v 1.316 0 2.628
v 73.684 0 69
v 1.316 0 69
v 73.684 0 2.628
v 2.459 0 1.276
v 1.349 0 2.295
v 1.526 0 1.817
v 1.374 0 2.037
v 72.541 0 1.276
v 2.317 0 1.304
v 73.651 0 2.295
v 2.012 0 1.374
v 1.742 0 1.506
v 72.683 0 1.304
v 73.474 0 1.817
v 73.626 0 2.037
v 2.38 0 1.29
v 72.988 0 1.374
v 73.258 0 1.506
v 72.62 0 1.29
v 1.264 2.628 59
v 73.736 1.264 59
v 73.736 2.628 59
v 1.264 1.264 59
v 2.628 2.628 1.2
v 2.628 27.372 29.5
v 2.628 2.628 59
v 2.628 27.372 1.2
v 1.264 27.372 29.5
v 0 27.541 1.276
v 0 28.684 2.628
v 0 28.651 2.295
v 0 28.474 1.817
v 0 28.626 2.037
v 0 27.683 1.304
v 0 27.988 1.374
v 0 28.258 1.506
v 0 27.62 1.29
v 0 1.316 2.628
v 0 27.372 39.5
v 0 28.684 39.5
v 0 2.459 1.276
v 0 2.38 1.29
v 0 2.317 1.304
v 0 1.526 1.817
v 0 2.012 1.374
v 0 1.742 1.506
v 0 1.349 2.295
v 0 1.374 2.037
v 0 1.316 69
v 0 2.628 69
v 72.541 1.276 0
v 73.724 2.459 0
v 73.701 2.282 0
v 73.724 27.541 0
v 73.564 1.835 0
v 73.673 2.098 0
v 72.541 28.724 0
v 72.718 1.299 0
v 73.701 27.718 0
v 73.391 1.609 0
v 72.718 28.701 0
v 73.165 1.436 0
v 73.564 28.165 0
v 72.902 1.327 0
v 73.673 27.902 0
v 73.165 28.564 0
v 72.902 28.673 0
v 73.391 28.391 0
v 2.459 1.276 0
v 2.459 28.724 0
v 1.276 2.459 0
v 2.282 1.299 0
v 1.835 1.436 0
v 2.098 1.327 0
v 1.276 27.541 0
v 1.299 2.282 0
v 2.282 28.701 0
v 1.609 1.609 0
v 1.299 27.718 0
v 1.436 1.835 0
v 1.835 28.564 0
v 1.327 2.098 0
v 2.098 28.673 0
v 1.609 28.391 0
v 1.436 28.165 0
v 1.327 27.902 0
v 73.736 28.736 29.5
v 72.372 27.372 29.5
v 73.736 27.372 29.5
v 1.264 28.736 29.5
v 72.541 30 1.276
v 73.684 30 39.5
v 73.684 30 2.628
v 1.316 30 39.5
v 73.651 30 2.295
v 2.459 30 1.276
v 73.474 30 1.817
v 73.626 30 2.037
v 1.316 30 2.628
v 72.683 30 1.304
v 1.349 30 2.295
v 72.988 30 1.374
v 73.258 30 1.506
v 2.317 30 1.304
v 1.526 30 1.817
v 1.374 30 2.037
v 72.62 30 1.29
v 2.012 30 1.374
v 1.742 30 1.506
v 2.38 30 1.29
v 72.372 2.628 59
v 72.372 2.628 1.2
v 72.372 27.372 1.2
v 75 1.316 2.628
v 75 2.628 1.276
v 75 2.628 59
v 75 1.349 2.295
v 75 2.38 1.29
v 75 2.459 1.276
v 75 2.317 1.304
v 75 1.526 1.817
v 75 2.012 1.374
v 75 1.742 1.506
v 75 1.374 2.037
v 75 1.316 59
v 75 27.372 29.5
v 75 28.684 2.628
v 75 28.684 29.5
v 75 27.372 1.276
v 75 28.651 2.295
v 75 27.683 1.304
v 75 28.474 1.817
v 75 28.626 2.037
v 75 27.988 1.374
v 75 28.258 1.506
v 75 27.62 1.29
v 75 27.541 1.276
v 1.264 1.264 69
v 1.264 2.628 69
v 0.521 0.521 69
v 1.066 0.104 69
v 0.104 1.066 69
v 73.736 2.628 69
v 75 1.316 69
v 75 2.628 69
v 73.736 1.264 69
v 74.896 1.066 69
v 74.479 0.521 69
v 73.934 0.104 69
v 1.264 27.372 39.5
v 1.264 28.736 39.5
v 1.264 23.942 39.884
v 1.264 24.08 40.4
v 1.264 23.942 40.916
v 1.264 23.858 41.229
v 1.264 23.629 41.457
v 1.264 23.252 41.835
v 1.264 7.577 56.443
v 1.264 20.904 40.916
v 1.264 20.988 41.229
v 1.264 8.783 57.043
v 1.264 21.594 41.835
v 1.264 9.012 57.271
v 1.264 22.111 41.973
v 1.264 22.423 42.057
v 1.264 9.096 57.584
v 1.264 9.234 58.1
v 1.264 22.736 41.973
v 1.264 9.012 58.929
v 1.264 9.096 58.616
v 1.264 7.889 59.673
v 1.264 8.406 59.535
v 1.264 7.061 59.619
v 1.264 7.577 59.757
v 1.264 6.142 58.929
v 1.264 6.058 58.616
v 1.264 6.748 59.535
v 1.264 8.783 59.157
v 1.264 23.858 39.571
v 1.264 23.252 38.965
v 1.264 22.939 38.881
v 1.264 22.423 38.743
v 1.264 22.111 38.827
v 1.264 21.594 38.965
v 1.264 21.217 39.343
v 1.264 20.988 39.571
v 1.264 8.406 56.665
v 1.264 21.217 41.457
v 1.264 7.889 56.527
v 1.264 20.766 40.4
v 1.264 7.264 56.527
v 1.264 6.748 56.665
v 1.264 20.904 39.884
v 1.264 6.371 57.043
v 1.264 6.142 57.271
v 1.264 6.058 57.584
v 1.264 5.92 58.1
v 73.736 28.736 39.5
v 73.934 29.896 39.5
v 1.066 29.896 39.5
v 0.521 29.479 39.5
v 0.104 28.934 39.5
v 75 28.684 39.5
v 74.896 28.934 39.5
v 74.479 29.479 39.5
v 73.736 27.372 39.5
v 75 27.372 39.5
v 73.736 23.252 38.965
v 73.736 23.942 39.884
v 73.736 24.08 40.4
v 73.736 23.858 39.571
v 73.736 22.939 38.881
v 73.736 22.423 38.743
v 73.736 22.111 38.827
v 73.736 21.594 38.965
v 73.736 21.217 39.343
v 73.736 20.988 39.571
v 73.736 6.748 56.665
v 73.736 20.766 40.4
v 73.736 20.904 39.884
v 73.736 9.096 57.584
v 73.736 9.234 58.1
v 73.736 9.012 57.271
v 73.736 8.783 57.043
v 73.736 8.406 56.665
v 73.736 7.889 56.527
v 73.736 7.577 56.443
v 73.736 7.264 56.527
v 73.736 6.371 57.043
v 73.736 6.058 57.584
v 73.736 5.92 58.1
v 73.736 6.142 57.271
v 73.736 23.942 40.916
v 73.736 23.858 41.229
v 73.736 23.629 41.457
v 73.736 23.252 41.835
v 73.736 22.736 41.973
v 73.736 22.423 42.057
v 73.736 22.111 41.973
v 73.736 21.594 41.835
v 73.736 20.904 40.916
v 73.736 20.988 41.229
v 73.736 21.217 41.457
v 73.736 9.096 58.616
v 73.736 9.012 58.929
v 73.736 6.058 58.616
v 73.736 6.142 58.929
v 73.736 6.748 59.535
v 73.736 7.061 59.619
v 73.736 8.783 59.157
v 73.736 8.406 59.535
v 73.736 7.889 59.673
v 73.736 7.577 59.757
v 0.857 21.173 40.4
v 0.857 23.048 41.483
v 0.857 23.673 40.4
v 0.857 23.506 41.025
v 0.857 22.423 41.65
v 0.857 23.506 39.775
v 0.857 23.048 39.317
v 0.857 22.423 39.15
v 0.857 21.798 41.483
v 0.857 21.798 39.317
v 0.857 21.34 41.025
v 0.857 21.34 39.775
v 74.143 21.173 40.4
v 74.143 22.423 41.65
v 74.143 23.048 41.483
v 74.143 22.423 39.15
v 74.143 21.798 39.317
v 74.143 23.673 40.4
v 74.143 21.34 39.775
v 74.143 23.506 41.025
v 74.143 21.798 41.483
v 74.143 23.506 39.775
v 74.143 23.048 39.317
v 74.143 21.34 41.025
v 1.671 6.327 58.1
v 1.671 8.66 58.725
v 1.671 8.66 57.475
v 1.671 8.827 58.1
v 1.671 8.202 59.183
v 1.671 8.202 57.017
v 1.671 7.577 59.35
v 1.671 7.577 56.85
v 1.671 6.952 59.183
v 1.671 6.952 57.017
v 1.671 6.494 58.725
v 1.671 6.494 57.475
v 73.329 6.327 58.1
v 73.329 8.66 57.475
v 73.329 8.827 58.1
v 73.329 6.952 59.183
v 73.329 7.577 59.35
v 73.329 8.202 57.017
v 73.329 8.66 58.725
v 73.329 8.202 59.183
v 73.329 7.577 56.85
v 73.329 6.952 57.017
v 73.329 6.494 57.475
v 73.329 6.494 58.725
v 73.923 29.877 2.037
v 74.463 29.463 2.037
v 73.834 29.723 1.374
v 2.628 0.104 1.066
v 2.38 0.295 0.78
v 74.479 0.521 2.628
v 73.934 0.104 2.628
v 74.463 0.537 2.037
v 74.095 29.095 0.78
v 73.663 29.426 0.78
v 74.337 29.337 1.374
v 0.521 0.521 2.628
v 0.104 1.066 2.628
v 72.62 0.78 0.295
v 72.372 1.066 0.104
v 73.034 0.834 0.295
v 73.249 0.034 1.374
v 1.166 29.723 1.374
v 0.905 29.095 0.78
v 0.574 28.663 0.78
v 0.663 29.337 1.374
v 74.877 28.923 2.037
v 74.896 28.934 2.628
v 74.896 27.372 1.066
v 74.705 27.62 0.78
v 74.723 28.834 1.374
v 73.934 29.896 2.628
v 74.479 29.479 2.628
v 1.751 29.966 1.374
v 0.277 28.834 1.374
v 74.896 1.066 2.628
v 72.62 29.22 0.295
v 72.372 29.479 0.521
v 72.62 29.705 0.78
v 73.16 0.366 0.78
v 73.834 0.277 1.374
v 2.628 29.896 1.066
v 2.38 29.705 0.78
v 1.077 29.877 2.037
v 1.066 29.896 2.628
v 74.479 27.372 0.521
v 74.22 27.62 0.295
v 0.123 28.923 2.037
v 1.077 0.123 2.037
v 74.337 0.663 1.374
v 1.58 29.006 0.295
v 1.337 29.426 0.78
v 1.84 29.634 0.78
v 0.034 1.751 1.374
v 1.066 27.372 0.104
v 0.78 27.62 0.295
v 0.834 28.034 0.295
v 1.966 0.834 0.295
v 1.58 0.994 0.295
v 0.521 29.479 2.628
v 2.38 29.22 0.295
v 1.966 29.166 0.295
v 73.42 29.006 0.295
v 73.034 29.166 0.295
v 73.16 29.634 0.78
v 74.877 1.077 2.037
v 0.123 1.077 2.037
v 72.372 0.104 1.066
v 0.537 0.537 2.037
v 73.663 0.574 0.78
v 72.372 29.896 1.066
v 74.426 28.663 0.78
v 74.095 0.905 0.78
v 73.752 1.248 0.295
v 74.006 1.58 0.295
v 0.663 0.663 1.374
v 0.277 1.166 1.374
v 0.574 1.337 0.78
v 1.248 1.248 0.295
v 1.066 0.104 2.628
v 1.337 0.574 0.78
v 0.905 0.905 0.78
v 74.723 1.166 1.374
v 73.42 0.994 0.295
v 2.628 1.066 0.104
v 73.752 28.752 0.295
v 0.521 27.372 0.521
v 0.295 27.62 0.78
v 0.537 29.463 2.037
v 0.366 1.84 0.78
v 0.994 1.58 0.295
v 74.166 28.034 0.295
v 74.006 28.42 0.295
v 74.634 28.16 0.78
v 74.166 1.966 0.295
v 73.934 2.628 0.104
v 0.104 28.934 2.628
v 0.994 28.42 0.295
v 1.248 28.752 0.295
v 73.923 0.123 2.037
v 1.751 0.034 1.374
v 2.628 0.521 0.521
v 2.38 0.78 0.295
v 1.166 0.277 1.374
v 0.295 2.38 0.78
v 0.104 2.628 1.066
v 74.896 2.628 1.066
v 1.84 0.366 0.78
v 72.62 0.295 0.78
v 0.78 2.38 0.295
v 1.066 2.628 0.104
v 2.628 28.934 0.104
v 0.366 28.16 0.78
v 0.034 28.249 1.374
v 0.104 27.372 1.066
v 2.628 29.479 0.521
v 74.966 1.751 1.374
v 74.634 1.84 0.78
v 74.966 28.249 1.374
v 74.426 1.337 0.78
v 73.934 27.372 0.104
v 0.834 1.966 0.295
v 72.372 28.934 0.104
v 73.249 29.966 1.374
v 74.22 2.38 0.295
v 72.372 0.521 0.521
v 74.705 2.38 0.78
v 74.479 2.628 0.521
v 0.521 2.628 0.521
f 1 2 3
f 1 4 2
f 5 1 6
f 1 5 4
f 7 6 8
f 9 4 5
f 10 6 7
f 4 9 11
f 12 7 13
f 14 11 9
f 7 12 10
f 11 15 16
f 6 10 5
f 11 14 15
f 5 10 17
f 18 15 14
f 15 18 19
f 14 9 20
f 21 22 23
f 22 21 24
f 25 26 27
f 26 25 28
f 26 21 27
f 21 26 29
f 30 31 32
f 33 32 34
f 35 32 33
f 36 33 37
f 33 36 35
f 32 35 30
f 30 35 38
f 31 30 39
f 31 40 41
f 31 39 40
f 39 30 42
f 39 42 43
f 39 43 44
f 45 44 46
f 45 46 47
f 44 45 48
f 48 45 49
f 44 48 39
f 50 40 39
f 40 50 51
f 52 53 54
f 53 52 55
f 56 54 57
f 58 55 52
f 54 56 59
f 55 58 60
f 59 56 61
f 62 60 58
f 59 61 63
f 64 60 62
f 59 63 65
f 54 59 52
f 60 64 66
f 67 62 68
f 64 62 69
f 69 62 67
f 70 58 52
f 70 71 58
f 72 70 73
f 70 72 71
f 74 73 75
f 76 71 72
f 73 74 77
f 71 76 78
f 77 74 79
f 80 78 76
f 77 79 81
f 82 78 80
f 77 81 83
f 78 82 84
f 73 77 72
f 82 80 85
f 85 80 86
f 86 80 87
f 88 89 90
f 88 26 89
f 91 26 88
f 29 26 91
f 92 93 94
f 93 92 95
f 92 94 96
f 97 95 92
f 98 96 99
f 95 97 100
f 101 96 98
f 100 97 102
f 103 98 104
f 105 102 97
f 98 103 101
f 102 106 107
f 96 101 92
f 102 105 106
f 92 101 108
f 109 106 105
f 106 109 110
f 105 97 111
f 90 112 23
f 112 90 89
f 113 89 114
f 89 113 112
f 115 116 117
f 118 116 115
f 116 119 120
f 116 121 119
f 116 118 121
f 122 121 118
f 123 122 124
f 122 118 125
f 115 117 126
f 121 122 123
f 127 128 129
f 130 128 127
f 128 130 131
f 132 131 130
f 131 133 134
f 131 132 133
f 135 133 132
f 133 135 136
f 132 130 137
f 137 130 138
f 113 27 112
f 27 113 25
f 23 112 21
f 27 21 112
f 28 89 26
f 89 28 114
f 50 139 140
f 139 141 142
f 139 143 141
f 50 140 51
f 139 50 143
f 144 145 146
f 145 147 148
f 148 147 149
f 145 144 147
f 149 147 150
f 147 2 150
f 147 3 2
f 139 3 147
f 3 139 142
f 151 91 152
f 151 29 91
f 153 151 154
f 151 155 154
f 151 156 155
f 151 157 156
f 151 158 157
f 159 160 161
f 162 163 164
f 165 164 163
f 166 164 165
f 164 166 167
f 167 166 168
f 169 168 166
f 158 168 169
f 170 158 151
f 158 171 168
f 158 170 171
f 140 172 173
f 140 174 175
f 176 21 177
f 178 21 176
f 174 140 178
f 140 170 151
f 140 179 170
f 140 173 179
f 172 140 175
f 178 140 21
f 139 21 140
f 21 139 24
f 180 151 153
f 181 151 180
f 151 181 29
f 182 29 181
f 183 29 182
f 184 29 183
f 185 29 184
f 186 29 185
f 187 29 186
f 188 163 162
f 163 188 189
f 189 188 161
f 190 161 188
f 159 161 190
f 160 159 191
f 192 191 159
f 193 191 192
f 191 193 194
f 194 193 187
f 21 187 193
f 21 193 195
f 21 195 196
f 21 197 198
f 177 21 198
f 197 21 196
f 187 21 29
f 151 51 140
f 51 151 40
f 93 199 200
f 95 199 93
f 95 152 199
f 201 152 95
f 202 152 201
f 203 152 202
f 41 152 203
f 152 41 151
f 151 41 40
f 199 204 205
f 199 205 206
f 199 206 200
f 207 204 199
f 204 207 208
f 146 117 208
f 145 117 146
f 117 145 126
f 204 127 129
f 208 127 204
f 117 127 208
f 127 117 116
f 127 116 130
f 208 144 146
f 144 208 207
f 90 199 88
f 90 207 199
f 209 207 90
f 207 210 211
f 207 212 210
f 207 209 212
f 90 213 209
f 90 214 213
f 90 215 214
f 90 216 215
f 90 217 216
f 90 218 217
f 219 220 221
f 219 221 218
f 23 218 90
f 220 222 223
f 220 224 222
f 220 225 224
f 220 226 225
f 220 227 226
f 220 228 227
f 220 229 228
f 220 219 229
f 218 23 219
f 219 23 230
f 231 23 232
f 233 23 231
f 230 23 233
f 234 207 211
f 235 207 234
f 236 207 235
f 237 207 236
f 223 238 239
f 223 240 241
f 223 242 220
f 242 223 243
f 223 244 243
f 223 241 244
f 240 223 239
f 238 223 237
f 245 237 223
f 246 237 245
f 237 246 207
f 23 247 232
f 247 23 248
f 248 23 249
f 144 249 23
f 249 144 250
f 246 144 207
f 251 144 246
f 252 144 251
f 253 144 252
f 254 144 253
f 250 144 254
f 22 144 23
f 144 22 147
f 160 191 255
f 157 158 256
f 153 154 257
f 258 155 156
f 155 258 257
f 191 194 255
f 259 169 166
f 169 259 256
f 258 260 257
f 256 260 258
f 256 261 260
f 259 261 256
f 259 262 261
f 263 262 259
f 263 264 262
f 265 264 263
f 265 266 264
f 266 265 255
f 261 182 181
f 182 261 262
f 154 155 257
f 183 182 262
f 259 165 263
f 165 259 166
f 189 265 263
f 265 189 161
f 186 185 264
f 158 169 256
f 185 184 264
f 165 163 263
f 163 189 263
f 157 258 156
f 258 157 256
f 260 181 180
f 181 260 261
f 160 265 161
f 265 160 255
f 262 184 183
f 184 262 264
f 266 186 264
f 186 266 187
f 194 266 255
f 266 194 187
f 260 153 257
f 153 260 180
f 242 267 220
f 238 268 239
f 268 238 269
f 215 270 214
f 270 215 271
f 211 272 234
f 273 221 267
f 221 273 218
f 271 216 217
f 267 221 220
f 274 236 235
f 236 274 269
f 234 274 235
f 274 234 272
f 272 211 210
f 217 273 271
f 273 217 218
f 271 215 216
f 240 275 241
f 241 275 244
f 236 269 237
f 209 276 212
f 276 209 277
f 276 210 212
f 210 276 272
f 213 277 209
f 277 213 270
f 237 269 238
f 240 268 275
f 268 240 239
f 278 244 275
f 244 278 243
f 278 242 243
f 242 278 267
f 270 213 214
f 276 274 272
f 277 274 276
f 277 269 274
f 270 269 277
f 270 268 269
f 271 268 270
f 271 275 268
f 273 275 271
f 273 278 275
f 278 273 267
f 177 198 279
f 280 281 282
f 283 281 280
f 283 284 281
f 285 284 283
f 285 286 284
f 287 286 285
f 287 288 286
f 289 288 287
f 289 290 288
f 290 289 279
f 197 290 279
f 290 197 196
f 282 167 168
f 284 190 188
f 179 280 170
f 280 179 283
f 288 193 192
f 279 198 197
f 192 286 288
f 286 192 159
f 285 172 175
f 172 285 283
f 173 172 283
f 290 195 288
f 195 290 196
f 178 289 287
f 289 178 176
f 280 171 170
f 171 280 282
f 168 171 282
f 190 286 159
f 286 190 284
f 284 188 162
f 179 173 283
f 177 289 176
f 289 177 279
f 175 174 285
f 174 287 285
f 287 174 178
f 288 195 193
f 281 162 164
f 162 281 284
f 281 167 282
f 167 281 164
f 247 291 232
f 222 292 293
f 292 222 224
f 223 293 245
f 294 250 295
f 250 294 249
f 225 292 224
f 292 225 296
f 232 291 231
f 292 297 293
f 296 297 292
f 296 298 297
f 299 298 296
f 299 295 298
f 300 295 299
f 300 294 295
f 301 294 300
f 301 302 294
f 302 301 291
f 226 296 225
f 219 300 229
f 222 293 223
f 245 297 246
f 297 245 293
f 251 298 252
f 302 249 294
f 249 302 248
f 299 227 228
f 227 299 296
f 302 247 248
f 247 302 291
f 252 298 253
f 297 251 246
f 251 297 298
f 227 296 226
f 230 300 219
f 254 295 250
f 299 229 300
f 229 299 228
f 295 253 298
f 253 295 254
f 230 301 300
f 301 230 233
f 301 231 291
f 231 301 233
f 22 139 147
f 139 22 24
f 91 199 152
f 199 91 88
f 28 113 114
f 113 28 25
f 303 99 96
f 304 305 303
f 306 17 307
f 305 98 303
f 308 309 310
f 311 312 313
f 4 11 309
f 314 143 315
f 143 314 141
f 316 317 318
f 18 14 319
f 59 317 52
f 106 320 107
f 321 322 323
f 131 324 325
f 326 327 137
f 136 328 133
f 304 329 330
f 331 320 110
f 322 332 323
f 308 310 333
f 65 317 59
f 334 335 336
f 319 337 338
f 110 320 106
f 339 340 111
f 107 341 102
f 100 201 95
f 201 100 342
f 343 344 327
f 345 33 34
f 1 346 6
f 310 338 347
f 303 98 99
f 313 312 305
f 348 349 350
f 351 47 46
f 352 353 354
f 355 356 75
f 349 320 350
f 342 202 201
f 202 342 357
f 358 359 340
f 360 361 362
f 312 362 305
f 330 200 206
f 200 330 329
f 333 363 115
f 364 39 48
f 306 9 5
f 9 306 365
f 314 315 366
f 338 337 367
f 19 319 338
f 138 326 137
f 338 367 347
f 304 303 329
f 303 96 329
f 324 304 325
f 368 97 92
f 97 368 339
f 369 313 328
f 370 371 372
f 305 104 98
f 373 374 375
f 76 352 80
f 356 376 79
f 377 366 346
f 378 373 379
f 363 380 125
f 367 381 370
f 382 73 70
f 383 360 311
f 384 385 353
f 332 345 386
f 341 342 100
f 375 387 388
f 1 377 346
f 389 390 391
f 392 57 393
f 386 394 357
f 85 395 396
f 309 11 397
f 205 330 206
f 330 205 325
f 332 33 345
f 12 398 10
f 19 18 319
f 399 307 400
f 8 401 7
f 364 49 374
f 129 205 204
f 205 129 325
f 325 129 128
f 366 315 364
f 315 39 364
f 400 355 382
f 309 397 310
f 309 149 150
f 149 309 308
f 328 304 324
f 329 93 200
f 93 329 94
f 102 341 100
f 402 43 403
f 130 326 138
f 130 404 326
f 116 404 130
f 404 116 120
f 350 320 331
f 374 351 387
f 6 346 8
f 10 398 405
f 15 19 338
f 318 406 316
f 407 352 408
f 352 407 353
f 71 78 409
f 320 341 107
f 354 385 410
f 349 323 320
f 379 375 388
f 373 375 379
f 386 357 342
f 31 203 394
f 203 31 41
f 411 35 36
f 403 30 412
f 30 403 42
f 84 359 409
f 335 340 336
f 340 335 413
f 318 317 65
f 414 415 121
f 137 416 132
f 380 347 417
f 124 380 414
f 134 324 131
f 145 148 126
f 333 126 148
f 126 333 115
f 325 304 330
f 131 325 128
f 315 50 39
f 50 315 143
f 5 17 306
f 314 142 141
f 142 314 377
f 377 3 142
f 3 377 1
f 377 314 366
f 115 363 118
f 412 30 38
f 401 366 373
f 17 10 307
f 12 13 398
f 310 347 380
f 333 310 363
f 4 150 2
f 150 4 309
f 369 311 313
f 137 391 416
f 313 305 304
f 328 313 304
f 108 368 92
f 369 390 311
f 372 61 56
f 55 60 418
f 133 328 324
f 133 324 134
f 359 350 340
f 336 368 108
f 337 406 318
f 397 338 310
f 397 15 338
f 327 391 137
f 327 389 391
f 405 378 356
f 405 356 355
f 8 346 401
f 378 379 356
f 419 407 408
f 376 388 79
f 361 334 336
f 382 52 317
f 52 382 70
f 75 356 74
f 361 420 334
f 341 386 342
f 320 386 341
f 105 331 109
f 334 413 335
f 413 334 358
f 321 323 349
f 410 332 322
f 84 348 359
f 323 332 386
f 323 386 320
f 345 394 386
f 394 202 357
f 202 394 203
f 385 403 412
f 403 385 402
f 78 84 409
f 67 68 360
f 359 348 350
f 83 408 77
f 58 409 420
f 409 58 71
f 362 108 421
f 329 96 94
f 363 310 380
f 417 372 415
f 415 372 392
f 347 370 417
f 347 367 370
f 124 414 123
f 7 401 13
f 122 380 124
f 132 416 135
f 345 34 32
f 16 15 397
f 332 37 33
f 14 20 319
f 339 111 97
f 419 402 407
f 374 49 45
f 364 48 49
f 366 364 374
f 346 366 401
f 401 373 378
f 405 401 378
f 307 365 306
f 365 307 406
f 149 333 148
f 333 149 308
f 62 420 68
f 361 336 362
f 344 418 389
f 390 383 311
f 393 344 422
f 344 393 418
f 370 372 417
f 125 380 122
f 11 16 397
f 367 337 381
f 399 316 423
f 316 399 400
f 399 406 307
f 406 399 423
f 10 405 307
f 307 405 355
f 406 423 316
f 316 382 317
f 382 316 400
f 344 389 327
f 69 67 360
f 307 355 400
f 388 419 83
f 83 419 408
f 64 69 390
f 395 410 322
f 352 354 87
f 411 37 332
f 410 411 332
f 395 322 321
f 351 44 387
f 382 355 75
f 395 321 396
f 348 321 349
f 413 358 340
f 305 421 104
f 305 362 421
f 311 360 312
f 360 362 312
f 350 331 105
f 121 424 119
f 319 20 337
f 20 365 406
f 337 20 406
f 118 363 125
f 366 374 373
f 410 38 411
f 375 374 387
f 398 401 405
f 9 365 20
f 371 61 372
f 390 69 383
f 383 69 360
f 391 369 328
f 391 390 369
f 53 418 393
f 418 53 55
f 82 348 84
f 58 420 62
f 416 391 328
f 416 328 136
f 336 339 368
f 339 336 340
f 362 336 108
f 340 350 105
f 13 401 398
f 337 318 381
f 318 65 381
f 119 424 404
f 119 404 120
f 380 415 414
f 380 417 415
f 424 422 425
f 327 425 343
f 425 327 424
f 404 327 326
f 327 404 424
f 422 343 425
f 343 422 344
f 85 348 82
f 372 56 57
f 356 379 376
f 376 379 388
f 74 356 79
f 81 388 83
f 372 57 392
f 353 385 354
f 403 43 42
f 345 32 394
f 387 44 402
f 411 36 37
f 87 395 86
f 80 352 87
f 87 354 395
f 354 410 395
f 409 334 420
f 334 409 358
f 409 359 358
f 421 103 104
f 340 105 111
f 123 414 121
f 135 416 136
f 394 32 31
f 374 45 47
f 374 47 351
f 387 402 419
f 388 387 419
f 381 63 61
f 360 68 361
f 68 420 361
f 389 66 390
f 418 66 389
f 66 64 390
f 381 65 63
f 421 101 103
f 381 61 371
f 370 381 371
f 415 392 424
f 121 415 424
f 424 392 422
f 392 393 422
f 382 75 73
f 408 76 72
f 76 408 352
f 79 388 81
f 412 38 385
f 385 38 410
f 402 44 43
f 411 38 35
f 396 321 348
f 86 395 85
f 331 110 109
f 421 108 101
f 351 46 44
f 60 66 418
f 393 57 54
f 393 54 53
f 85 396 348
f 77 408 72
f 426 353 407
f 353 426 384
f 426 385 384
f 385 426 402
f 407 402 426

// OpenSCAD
layer_height = 0.2;
extrusion_width = 0.45;
extrusion_overlap = layer_height * (1 - PI/4);
extrusion_spacing = extrusion_width - extrusion_overlap;

// convert between path counts and spacing, qspace to quantize
function xspace(n=1) = n*extrusion_spacing;
function nspace(x=xspace()) = x/extrusion_spacing;
function qspace(x=xspace()) = xspace(round(nspace(x)));
function cspace(x=xspace()) = xspace(ceil(nspace(x)));
function fspace(x=xspace()) = xspace(floor(nspace(x)));

// convert between path counts and width, qspace to quantize
function xwall(n=1) = xspace(n) + (0<n ? extrusion_overlap : 0);
function nwall(x=xwall()) =  // first path gets full extrusion width
    x < 0 ? nspace(x) :
    x < extrusion_overlap ? 0 :
    nspace(x - extrusion_overlap);
function qwall(x=xwall()) = xwall(round(nwall(x)));
function cwall(x=xwall()) = xwall(ceil(nwall(x)));
function fwall(x=xwall()) = xwall(floor(nwall(x)));

// quantize thin walls only (less than n paths wide, default for 2 perimeters)
function qthin(x=xwall(), n=4.5) = x < xwall(n) ? qwall(x) : x;
function cthin(x=xwall(), n=4.5) = x < xwall(n) ? cwall(x) : x;
function fthin(x=xwall(), n=4.5) = x < xwall(n) ? fwall(x) : x;

tolerance = 0.001;
border = 1;

$fa = 30;
$fs = min(layer_height, xspace(1/2));

card = [2.5*25.4, 0.325, 3.5*25.4];  // standard playing card dimensions
double_sleeve = 0.3;
thick_sleeve = 0.2;
thin_sleeve = 0.1;
function double_sleeve_count(d) = floor(d / (card[1] + double_sleeve));
function thick_sleeve_count(d) = floor(d / (card[1] + thick_sleeve));
function thin_sleeve_count(d) = floor(d / (card[1] + thin_sleeve));
function unsleeved_count(d) = floor(d / card[1]);

function unit_axis(n) = [for (i=[0:1:2]) i==n ? 1 : 0];

// common sleeve dimensions
FFG = [66.5, 0.2, 94];

wall0 = xwall(3);
gap0 = 0.1;
join0 = 10;
seam0 = 1/3;
rise0 = 1/3;

module beveler(size, flats=1, walls=1, center=false) {
    function unit_axis(n) = [for (i=[0:1:2]) i==n ? 1 : 0];
    module bevel(w, n=0) {
        a = unit_axis(n);
        v = [1, 1, 1] - a;
        aj = (n-1+3) % 3;
        ak = (n+1+3) % 3;
        for (j=[1,-1]) for (k=[1,-1]) {
            dj = j*unit_axis(aj)*size[aj]/2;
            dk = k*unit_axis(ak)*size[ak]/2;
            translate(origin+dj+dk)
                rotate(45*a) cube(a*(size[n]+10) + v*sqrt(2)*w, center=true);
        }
    }
    xy = sqrt(2) * flats;
    z = sqrt(2) * walls;
    origin = center ? [0, 0, 0] : size/2;
    bevel(flats, 0);
    bevel(flats, 1);
    bevel(walls, 2);
}

module beveled_cube(size, flats=1, walls=1, center=false) {
    difference() {
        cube(size, center);
        beveler(size=size, flats=flats, walls=walls, center=center);
    }
}

module rounded_cube(size, thick=2*wall0+gap0, walls=wall0, center=false) {
    origin = center ? [0, 0, 0] : size/2;
    translate(origin) hull() {
        // rounded ends should be tangent to sides but sunk into the end to a
        // 30- or 45-degree angle to avoid overhangs
        x = size[0]/2;
        y = size[1]/2;
        z = size[2]/2;
        R = max(thick, walls);
        B = min(thick, walls);
        L = B*sqrt(2)/2;
        S = R - sqrt(R*R - L*L);
        O = (R+L-S)*sqrt(2)/2;  // (R-S)*sqrt(2)/2;
        $fa=15;
        intersection() {
            cube(size, center=true);
            hull() {
                for (xs=[1,-1]) for (ys=[1,-1]) for (zs=[1,-1]) {
                    translate([xs*(x-O), ys*(y-O), zs*(z-O)]) sphere(r=R);
                    translate([0, ys*(y-O), zs*(z-O)])
                        rotate([0, xs*90, 0]) cylinder(r=R, h=x-R);
                    translate([xs*(x-O), 0, zs*(z-O)])
                        rotate([ys*90, 0, 0]) cylinder(r=R, h=y-R);
                    translate([xs*(x-O), ys*(y-O), 0])
                        rotate([zs*90+90, 0, 0]) cylinder(r=R, h=z-R);
                }
            }
        }
    }
}

// TODO: dividers
// TODO: logos & labels
module deckbox(out=undef, in=undef, wall=wall0, gap=gap0, join=join0,
               seam=seam0, rise=rise0, rounded=true, lid=false, ghost=undef) {
    module side(w, d0, d1, h0, h1) {
        shape = [[0, 0], [0, h0+h1], [d0, h0+h1], [d0+d1, h0], [d0+d1, 0]];
        if (0<h1) rotate([90, 0, 90]) linear_extrude(w) polygon(shape);
        if (0<h0) cube([w, d0+d1+d0, h0]);
    }
    module snap(d, a=0) {
        jfit = join * cos(atan(z1/run));
        snaph = xspace(2);
        snapd = min(d, jfit-2*vgap-2*snaph);
        rotate([90, 0, a])
            cylinder(d1=snapd+2*snaph, d2=snapd, h=snaph, center=true);
    }
    module box(wall, join=0, inset=0) {
        space = join && inset ? vgap : 0;
        translate([inset, inset, 0])
            cube([box[0]-2*inset, wall, z0+z1+join-space]);  // back
        translate([inset, box[1]-wall-inset, 0])
            cube([box[0]-2*inset, wall, z0+join-space]);  // front
        difference() {
            for (x=[inset, box[0]-wall-inset]) translate([x, inset, 0])
                side(wall, thick-inset, run, z0+join-space, z1);
            if (join) {  // snap
                y = thick + 4/5*run;
                z = z0 + 1/5*z1 + join/2;
                translate([inset?inset:wall, y, z])
                    snap(join/4, inset?90:-90);
                translate([box[0]-(inset?inset:wall), y, z]) mirror([1, 0, 0])
                    snap(join/4, inset?90:-90);
            }
        }
        if (join) {  // snap
            y = thick + 1/5*run;
            z = z0 + 4/5*z1 + join/2;
            translate([inset?inset:wall, y, z]) mirror([1, 0, 0])
                snap(join/4, inset?90:-90);
            translate([box[0]-(inset?inset:wall), y, z])
                snap(join/4, inset?90:-90);
        }
    }

    vgap = max(gap, layer_height);
    flat = round(wall/layer_height) * layer_height;
    thick = 2*wall + gap;
    in0 = [thick, thick, flat];
    box = is_undef(out) ? in + 2*in0 : out;
    run = box[1]-2*thick;
    z1 = rise * (box[2] - join);
    z0 = (lid ? 1 - rise - seam : seam) * (box[2] - join);
    echo("exterior", box);
    echo("interior", box - 2*in0);
    echo("lid angle", z1, run, atan(z1/run));
    echo("double sleeve", double_sleeve_count(run));
    echo("thick sleeve", thick_sleeve_count(run));
    echo("thin sleeve", thin_sleeve_count(run));
    echo("unsleeved", unsleeved_count(run));

    // reference objects
    %if (ghost) translate([0, box[1], box[2]]) rotate([0, 180, 0])
        deckbox(out, in, wall, gap, join, seam, rise, lid=!lid, ghost=false);
    %if (ghost!=false) translate(in0) cube(box-2*in0);

    intersection() {
        if (lid) {
            cube([box[0], box[1], flat]);  // floor
            box(thick);  // wall
            box(wall, join);  // joint
        }
        else {
            inset = thick - wall;
            translate([inset, inset, 0])
                cube([box[0]-2*inset, box[1]-2*inset, flat]);  // floor
            box(thick);  // wall
            box(wall, join, inset);  // joint
        }
        if (rounded) rounded_cube(box, thick, wall);
        else beveled_cube(box, thick, xspace(2));
    }
}

module set(out=undef, in=undef, wall=wall0, gap=gap0, join=join0,
           seam=seam0, rise=rise0, rounded=true, ghost=undef) {
    flat = round(wall/layer_height) * layer_height;
    thick = 2*wall + gap;
    in0 = [thick, thick, flat];
    box = is_undef(out) ? in + 2*in0 : out;
    echo(box);
    echo(box-2*in0);
    translate([box[0]+10, 0, 0])
        deckbox(out=out, in=in, wall=wall, gap=gap, join=join,
                seam=seam, rise=rise, rounded=rounded, ghost=ghost);
    deckbox(out=out, in=in, wall=wall, gap=gap, join=join,
            seam=seam, rise=rise, rounded=rounded, lid=true, ghost=ghost);
}

module bevel_test(out, wall=wall0, gap=gap0, rounded=true) {
    box = [out[0], out[1], 2*out[2]];
    flat = round(wall/layer_height) * layer_height;
    difference() {
        deckbox(out=box, wall=wall, gap=gap, join=out[2]-flat,
                rounded=rounded, lid=true, ghost=false);
        translate([-1/2, -1/2, out[2]]) cube(box+[1,1,1]);
    }
}

// commercial box sizes
Boulder100int = [68.5, 67.5, 93];
Boulder80int = [68.5, 55, 93];
Boulder60int = [68.5, 46.5, 93];
Boulder40int = [68.5, 30, 93];
Boulder100ext = [76, 75, 93];
Boulder80ext = [76, 60, 98.5];
Boulder60ext = [76, 49.9, 98.5];
Boulder40ext = [76, 35, 98.5];

Rocky75 = [75, 300/4, 98.5];
Rocky60 = [75, 300/5, 98.5];
Rocky50 = [75, 300/6, 98.5];
Rocky37 = [75, 300/8, 98.5];
Rocky33 = [75, 300/9, 98.5];
Rocky30 = [75, 300/10, 98.5];
Rocky25 = [75, 300/12, 98.5];

*deckbox(Rocky, ghost=false);
*deckbox(Rocky, lid=true, ghost=false);
*deckbox(in=Boulder80, ghost=true);
*deckbox(in=Boulder80, lid=true);

*set([25, 40*.6, 60], seam=0.2, rise=0.6);
*set([25, 25, 25], seam=0.1, rise=0.8);

*set(Rocky30);
*deckbox(Rocky30);
deckbox(Rocky30, lid=true);

*bevel_test([25, 25, 5]);

*rounded_cube(Rocky30);
